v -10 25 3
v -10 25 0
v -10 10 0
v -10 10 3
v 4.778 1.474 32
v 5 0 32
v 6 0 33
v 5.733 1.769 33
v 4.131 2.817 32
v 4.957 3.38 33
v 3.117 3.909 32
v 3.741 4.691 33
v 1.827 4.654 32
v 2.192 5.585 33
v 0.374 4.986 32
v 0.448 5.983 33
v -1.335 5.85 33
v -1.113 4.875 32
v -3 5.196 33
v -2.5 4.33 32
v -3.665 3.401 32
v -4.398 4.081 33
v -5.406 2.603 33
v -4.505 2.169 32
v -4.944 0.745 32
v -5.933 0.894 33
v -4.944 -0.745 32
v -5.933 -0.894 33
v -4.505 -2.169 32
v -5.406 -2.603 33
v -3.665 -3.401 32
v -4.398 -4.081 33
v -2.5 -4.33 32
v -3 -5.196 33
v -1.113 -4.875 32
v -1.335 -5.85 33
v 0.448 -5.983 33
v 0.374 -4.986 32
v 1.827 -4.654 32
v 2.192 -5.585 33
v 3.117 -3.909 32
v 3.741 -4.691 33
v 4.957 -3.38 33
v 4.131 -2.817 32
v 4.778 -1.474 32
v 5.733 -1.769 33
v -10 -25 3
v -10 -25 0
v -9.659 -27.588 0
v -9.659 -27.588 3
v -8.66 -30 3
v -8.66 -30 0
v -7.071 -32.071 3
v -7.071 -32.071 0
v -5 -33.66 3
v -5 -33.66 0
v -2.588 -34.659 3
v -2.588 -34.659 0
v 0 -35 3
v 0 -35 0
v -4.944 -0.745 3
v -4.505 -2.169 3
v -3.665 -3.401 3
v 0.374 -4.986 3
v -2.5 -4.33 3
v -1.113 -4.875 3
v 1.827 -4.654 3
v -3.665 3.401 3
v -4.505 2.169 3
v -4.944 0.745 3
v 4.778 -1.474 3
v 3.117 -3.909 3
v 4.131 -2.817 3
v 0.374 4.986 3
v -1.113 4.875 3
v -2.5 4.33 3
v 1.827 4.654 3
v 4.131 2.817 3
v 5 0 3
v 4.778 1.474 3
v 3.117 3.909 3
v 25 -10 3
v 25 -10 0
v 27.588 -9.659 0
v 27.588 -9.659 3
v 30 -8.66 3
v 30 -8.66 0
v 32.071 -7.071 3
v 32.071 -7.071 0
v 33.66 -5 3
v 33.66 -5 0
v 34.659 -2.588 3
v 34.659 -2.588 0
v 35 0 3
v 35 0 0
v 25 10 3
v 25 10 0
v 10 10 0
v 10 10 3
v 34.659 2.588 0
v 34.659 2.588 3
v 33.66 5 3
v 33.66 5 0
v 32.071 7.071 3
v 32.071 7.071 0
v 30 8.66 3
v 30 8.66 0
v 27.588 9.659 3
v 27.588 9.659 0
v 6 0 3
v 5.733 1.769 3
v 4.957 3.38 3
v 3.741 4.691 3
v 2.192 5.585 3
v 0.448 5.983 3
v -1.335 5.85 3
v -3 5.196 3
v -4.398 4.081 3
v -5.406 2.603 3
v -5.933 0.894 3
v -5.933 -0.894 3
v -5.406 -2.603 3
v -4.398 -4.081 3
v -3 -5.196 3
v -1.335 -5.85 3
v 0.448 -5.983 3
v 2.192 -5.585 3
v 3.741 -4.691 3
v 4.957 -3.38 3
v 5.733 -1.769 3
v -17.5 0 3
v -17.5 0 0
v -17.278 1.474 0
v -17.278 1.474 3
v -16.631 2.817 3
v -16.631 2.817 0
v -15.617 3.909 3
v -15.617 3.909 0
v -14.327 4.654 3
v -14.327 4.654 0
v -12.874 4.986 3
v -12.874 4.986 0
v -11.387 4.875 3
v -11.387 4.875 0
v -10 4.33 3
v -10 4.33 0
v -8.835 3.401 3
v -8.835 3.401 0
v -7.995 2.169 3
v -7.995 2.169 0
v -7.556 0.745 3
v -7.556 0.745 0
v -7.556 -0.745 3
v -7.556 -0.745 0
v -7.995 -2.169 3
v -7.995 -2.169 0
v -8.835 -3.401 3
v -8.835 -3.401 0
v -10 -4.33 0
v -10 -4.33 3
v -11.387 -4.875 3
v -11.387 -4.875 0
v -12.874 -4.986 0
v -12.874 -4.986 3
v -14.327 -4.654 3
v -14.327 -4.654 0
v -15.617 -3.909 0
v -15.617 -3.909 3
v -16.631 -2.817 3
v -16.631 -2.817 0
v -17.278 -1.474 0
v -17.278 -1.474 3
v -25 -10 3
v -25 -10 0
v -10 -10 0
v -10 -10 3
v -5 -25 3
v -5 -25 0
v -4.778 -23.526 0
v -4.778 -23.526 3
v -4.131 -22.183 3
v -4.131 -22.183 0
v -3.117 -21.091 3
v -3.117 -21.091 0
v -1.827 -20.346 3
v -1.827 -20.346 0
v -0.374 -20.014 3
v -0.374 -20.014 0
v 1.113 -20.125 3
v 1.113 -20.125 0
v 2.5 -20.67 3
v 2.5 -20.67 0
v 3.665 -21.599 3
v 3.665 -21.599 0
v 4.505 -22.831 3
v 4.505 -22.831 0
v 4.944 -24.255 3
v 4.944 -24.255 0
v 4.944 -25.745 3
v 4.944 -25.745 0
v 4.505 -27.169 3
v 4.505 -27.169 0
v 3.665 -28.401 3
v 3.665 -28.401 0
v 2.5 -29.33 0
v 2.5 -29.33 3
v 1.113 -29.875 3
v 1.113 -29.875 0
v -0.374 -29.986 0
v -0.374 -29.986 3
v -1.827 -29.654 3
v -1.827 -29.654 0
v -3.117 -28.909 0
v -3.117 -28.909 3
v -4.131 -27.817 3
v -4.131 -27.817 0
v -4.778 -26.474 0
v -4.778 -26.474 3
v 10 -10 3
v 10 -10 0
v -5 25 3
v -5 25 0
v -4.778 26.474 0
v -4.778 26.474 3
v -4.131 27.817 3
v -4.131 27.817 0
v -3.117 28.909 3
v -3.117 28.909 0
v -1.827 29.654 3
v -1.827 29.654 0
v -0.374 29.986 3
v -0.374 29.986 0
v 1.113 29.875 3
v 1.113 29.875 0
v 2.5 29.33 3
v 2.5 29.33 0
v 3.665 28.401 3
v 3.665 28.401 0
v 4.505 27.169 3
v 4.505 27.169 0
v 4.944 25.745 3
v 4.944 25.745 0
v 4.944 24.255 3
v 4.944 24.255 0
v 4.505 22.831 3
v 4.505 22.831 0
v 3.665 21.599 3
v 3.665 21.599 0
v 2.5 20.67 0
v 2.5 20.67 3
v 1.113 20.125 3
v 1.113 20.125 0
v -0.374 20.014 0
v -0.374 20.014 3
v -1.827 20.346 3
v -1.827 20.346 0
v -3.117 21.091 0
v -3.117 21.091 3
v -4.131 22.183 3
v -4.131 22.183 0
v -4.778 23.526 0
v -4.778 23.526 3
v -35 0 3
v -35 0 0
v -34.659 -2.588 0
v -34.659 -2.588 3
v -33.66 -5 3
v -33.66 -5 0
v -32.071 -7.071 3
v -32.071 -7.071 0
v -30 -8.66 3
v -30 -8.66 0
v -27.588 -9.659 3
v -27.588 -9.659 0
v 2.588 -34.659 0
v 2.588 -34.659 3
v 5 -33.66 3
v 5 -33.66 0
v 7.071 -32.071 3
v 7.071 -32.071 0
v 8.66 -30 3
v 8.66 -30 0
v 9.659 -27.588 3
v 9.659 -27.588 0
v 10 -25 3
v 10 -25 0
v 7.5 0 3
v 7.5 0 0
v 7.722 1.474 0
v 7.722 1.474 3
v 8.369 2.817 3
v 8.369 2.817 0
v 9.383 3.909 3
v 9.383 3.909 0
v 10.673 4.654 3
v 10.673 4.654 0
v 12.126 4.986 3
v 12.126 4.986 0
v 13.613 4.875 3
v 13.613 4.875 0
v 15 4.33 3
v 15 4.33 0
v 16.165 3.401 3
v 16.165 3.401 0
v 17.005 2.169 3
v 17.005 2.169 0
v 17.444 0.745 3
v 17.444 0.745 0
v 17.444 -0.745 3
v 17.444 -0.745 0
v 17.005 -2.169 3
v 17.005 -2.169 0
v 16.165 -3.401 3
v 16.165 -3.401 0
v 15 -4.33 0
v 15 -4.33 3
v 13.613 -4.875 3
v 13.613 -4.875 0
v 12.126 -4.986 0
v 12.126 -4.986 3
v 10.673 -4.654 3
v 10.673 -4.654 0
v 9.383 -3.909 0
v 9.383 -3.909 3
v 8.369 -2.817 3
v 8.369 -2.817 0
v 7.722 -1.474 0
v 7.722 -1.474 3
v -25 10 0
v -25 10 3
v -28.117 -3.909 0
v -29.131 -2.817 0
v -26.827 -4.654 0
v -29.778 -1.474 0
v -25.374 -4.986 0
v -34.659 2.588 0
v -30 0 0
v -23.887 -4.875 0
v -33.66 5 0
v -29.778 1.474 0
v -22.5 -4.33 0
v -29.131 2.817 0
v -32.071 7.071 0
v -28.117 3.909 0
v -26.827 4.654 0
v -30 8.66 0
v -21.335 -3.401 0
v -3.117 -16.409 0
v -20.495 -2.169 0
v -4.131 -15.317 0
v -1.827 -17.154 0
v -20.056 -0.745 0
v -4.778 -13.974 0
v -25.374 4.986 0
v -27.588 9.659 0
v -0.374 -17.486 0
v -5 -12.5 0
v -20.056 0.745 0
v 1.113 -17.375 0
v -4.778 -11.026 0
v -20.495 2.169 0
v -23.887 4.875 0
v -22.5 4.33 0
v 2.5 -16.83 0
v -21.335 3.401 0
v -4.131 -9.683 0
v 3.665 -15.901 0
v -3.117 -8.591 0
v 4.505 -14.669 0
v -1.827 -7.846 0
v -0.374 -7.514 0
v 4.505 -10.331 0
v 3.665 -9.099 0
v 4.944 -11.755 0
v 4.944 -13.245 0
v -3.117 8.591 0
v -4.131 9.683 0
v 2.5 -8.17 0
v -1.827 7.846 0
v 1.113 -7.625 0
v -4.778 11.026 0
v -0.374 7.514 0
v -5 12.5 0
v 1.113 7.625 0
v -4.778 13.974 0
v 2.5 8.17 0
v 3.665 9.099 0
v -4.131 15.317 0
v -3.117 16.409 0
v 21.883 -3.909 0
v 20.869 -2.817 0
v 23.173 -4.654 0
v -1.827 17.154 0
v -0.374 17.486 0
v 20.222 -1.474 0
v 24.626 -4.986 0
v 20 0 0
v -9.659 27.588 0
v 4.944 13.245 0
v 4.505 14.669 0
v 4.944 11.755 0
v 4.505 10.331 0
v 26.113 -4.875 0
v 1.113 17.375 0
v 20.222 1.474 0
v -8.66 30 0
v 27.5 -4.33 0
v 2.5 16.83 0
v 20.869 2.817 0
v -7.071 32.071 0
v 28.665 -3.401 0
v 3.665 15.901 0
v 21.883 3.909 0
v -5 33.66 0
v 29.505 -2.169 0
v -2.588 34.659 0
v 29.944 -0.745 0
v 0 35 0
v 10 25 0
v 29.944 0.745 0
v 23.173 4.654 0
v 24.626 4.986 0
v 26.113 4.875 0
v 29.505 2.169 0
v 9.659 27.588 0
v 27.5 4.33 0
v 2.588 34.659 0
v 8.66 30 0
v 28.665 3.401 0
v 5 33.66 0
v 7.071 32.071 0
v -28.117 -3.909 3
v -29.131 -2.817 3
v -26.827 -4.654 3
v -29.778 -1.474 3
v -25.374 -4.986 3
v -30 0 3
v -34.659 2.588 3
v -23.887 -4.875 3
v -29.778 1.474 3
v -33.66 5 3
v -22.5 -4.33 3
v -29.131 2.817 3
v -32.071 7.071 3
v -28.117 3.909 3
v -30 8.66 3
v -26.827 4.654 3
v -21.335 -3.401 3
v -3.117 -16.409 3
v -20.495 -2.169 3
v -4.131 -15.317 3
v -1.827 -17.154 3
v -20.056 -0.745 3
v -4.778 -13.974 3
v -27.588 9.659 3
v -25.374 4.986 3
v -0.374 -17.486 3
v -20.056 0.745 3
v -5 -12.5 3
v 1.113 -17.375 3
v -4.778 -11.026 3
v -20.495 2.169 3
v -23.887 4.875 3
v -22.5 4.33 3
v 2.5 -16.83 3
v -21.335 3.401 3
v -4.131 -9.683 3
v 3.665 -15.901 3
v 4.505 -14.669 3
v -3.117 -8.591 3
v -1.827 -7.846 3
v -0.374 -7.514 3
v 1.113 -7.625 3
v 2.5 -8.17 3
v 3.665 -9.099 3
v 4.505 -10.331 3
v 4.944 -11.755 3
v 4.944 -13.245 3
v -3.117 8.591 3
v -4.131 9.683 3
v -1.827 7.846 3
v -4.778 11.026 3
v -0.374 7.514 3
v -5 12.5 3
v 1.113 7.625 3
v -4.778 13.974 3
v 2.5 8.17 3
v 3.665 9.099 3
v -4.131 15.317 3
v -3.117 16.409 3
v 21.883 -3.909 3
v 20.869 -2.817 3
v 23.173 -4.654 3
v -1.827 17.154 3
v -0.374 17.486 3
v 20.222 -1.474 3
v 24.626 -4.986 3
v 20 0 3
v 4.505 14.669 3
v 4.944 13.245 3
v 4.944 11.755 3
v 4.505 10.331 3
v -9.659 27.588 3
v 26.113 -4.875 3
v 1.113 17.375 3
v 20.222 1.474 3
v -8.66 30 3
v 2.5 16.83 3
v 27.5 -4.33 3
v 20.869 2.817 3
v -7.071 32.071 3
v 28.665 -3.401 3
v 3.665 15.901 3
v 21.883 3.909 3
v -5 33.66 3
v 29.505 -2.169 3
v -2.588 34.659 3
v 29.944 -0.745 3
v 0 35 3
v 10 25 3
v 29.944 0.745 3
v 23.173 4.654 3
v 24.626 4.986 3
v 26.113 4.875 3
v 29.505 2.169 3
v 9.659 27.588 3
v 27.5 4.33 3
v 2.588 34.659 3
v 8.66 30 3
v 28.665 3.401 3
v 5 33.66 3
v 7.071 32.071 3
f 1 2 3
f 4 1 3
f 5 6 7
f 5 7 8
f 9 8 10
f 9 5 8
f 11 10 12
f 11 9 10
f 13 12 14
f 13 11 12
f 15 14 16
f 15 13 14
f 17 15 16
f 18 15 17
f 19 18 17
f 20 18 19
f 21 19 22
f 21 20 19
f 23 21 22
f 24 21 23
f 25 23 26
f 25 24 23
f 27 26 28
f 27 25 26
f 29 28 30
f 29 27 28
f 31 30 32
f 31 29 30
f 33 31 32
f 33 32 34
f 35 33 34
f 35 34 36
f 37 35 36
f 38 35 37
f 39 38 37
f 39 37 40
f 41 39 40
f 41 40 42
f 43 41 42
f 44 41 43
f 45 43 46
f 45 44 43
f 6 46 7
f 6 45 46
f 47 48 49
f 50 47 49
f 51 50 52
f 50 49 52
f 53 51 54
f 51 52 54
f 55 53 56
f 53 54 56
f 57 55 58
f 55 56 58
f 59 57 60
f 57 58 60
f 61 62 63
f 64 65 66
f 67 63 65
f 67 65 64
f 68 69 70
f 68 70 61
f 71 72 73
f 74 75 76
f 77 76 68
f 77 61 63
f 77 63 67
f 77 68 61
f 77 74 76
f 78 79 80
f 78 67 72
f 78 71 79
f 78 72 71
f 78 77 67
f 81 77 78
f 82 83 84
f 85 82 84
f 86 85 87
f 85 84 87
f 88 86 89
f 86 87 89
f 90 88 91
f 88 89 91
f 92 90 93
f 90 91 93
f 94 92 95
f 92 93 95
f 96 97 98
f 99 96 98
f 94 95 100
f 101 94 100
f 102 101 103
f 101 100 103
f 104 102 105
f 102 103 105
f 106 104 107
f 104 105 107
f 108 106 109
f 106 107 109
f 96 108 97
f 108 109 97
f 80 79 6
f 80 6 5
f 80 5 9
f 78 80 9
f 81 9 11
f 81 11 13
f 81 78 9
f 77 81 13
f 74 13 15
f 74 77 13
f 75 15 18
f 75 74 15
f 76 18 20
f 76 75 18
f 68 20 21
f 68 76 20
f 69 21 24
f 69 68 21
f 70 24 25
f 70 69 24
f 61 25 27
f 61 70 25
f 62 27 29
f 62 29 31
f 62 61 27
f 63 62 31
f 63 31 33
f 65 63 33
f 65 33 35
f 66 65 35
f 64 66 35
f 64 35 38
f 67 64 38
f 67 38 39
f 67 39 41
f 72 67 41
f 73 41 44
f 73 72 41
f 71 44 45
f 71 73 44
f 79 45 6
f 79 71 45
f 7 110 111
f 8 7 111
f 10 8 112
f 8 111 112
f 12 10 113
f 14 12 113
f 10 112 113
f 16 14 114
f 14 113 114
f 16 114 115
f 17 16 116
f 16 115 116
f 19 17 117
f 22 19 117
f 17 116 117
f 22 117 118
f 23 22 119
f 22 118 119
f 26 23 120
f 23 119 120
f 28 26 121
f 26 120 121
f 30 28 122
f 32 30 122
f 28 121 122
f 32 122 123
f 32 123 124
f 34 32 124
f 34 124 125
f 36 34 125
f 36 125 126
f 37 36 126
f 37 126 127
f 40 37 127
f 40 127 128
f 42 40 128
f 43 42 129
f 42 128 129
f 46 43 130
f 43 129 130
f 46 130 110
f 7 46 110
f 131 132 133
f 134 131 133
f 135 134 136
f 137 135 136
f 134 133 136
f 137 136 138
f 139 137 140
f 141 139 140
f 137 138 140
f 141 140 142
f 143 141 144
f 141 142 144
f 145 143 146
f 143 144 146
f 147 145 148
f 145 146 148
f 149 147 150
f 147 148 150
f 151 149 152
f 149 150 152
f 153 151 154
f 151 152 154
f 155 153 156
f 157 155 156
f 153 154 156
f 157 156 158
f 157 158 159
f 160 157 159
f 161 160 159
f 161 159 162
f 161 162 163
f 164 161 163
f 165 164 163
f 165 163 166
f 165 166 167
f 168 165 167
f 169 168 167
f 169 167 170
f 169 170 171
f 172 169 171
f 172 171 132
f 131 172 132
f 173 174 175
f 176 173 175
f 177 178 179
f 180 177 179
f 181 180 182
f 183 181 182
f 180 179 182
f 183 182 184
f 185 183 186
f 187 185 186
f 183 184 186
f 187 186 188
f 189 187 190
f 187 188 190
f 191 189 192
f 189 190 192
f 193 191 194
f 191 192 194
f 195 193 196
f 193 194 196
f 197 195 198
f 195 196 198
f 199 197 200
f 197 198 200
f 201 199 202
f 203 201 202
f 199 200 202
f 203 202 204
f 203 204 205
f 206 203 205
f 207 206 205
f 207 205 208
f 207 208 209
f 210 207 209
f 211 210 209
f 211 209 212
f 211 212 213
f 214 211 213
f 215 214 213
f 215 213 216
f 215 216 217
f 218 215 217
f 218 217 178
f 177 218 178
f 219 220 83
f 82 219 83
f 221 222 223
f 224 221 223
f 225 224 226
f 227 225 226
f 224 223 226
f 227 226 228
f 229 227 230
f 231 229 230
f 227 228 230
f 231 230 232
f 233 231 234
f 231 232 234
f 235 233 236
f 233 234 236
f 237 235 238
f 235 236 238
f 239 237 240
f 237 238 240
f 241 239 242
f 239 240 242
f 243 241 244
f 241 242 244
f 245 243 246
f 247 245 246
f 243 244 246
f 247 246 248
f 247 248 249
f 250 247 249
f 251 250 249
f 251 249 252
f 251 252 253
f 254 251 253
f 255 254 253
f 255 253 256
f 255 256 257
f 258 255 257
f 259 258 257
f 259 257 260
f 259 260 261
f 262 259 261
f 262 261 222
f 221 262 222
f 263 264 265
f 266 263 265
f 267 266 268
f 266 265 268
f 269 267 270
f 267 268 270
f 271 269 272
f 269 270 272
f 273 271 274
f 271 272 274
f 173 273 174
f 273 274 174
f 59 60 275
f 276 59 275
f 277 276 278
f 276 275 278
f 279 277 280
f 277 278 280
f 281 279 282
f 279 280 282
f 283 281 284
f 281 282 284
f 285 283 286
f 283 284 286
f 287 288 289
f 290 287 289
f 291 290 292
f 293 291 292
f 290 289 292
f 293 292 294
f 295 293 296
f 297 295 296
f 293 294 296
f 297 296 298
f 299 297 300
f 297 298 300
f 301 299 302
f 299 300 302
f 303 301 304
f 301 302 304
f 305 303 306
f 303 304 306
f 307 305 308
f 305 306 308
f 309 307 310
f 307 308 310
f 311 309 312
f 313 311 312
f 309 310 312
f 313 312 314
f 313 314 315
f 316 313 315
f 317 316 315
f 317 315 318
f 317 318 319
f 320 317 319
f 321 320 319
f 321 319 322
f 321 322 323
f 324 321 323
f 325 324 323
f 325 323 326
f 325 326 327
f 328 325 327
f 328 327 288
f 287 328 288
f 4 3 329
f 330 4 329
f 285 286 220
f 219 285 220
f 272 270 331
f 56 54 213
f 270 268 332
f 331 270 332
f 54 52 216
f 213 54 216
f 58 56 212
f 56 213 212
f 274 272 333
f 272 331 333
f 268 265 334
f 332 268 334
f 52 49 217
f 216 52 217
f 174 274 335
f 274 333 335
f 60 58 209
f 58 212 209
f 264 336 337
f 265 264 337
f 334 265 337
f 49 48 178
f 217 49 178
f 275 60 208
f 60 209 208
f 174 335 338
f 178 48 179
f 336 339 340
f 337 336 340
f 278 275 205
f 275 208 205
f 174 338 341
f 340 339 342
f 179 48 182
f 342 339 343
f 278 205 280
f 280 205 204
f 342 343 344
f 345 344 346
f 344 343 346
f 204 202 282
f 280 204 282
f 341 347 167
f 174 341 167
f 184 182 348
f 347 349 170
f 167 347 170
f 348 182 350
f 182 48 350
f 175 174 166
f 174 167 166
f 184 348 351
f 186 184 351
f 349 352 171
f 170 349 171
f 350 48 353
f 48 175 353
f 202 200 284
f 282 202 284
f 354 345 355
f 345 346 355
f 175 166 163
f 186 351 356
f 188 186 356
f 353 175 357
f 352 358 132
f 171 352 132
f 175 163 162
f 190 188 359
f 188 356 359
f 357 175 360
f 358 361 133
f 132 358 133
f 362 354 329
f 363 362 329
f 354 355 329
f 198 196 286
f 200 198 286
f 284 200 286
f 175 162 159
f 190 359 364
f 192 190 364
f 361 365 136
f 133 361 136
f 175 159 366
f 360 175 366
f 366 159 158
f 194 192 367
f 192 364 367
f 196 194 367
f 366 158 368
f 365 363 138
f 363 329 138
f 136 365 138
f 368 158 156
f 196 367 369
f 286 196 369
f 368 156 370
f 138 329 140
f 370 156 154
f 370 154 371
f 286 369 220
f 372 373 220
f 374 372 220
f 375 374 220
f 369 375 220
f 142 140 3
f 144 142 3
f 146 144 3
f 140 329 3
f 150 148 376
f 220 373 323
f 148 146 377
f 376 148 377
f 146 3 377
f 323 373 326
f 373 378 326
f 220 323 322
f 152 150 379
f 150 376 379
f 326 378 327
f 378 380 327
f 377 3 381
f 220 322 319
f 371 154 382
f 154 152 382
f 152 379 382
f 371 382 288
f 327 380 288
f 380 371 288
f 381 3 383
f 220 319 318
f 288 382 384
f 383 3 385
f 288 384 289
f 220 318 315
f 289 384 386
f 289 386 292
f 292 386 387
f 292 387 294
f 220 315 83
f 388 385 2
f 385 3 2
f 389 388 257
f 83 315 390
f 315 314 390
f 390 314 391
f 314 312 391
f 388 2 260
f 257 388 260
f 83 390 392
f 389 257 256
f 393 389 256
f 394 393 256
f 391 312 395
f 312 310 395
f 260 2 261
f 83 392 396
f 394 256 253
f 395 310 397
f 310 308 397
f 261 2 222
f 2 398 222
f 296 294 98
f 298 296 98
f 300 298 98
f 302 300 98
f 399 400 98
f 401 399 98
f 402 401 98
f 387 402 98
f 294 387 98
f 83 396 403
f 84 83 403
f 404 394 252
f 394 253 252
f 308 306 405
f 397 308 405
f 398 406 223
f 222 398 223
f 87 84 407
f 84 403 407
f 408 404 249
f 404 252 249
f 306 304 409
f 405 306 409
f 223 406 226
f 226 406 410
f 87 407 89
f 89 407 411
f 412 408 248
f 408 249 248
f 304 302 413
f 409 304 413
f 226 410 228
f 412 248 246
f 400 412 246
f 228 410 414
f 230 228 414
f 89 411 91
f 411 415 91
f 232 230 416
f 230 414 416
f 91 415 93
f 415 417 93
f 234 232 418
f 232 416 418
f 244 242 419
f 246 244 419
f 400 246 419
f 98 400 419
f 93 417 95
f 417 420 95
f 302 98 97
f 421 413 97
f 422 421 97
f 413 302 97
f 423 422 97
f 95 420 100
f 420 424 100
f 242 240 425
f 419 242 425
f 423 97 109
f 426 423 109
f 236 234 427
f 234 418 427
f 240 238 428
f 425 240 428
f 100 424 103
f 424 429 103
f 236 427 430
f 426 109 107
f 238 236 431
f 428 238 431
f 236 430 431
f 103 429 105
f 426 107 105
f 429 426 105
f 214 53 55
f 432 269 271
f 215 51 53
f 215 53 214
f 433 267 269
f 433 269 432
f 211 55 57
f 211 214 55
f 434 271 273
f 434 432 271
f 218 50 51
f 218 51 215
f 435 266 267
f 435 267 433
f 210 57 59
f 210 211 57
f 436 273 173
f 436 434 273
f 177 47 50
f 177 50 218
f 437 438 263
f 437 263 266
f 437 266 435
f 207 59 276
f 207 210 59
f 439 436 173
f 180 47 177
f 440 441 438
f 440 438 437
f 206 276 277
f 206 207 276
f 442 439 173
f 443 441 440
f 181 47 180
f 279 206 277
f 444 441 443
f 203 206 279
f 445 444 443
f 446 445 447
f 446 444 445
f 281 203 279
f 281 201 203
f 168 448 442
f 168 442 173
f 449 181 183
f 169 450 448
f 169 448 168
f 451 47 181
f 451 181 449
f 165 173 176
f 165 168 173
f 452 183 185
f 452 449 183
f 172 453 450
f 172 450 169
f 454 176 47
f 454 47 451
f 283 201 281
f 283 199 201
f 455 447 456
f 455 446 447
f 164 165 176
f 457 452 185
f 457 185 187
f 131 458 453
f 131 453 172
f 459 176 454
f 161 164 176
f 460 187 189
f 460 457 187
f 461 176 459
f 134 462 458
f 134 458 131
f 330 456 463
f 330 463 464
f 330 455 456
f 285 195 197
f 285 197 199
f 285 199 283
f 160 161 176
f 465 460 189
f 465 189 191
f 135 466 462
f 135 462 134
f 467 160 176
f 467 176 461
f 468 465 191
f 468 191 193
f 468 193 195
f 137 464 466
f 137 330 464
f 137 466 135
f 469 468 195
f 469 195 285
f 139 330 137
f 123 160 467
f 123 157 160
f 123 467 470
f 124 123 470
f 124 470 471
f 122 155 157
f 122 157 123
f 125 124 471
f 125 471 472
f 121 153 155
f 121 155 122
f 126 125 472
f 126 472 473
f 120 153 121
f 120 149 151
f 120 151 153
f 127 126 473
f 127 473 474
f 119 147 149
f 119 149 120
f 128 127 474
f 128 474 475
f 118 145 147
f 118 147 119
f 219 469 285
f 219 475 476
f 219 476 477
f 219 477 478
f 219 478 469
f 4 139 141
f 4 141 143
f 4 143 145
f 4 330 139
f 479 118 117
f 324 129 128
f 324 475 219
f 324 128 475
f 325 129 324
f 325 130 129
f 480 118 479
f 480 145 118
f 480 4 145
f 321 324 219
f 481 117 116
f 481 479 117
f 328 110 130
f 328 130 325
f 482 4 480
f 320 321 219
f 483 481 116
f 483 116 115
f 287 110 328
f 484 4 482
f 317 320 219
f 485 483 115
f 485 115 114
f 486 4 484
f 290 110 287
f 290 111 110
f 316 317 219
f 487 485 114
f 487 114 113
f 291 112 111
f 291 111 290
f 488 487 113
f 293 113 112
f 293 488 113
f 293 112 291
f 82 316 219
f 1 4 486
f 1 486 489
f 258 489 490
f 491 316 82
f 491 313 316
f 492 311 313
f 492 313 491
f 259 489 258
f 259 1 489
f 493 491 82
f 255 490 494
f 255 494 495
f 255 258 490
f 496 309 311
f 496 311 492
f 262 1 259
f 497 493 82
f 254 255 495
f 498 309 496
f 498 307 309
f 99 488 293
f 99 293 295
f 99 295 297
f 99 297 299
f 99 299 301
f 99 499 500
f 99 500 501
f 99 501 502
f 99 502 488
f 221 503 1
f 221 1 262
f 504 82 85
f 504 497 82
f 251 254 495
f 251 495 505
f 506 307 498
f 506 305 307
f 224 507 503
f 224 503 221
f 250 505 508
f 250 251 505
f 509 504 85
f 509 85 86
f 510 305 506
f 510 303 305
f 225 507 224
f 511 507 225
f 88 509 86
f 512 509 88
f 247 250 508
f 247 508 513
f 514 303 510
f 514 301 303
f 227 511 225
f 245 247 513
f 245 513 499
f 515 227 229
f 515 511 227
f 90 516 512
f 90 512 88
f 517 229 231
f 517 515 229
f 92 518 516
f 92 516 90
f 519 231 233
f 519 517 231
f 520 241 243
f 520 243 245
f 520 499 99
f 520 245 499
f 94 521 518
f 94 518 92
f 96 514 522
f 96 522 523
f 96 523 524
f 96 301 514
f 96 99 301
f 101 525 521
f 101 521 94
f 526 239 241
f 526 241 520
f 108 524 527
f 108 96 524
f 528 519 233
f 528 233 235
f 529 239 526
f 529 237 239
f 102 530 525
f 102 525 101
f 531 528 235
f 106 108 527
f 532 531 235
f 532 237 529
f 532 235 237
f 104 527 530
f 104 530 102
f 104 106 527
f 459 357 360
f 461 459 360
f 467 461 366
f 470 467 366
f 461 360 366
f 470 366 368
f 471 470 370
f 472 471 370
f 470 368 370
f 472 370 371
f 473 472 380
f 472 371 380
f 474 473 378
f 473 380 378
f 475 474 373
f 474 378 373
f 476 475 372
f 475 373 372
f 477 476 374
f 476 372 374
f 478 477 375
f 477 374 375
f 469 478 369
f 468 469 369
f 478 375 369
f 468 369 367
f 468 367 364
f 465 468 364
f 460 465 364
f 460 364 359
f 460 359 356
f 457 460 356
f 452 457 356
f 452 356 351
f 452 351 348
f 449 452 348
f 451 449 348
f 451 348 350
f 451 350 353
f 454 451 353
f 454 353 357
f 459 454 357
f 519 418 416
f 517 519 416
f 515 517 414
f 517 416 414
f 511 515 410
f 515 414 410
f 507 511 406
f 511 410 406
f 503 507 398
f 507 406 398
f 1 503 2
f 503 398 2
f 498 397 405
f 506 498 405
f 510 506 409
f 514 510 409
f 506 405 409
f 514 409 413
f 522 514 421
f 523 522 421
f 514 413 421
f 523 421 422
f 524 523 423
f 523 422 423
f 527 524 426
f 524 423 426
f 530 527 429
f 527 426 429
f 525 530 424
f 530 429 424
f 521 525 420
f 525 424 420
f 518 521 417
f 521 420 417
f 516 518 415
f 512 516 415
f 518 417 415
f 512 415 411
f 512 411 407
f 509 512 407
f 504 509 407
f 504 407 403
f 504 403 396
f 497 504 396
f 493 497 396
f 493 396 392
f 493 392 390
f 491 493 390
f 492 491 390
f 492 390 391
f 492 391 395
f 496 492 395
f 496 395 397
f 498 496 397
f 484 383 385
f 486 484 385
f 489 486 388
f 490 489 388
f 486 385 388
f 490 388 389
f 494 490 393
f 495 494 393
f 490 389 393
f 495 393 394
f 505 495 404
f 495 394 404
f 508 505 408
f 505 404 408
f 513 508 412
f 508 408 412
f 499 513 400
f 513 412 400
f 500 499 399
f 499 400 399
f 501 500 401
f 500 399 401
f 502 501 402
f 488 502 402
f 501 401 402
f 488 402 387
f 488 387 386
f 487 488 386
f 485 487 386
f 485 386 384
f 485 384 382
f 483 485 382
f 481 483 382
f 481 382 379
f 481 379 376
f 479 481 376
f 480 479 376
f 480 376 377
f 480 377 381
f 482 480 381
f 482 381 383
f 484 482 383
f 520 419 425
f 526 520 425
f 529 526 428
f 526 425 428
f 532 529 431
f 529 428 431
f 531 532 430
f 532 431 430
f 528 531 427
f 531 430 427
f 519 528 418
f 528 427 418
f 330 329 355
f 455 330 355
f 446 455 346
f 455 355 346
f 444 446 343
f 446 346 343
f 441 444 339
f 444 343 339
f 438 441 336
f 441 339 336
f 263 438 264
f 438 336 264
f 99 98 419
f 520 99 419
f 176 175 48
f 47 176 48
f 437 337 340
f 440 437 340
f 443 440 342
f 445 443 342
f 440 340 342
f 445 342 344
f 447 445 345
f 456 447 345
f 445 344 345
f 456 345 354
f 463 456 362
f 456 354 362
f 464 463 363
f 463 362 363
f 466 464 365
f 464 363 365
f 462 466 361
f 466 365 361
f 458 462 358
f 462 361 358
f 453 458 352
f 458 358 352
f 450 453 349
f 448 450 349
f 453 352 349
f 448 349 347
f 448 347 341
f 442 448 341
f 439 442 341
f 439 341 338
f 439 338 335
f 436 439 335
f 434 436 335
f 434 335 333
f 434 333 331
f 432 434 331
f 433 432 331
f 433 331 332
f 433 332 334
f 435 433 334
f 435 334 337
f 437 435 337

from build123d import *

# Parameters (mm, degrees)
F1_DEPTH = 3
F3_D     = 10
F4_R     = 6
F4_R_2   = 5
F5_DEPTH = 30
F6_SIZE  = 0.99999


# Not quite as in the source:
# - a fillet or chamfer is up to 0.001 mm smaller than in the source, because OpenCascade refuses the exact size


with BuildPart() as f1:
    # F0 (on Top) → F1 (new body)
    with BuildSketch(Plane.XY):
        with BuildLine():
            Line((10, 10), (10, 25))
            ThreePointArc((10, 25), (7.0710678119, 32.0710678119), (0, 35))
            ThreePointArc((0, 35), (-7.0710678119, 32.0710678119), (-10, 25))
            Line((-10, 25), (-10, 10))
            Line((-10, 10), (-25, 10))
            ThreePointArc((-25, 10), (-32.0710678119, 7.0710678119), (-35, 0))
            ThreePointArc((-35, 0), (-32.0710678119, -7.0710678119), (-25, -10))
            Line((-25, -10), (-10, -10))
            Line((-10, -10), (-10, -25))
            ThreePointArc((-10, -25), (-7.0710678119, -32.0710678119), (0, -35))
            ThreePointArc((0, -35), (7.0710678119, -32.0710678119), (10, -25))
            Line((10, -25), (10, -10))
            Line((10, -10), (25, -10))
            ThreePointArc((25, -10), (32.0710678119, -7.0710678119), (35, 0))
            ThreePointArc((35, 0), (32.0710678119, 7.0710678119), (25, 10))
            Line((25, 10), (10, 10))
        make_face()
    extrude(amount=F1_DEPTH)

    # F3 (through all)
    with Locations(Plane.XY.offset(3)):
        with Locations((-25, 0), (-12.5, 0), (0, 25), (0, 12.5), (12.5, 0), (25, 0), (0, -12.5), (0, -25)):
            Hole(F3_D / 2)

    # F4 (on face) → F5 (join)
    with BuildSketch(Plane.XY.offset(3)):
        Circle(F4_R)
        Circle(F4_R_2, mode=Mode.SUBTRACT)
    extrude(amount=F5_DEPTH)

    # F6 (size 1 in the source; OpenCascade refuses exactly that, so slightly less here)
    f6_edges = [f1.edges().sort_by_distance(p)[0] for p in [
        (-5, 0, 33),
    ]]
    chamfer(f6_edges, length=F6_SIZE)


solid = f1.part
